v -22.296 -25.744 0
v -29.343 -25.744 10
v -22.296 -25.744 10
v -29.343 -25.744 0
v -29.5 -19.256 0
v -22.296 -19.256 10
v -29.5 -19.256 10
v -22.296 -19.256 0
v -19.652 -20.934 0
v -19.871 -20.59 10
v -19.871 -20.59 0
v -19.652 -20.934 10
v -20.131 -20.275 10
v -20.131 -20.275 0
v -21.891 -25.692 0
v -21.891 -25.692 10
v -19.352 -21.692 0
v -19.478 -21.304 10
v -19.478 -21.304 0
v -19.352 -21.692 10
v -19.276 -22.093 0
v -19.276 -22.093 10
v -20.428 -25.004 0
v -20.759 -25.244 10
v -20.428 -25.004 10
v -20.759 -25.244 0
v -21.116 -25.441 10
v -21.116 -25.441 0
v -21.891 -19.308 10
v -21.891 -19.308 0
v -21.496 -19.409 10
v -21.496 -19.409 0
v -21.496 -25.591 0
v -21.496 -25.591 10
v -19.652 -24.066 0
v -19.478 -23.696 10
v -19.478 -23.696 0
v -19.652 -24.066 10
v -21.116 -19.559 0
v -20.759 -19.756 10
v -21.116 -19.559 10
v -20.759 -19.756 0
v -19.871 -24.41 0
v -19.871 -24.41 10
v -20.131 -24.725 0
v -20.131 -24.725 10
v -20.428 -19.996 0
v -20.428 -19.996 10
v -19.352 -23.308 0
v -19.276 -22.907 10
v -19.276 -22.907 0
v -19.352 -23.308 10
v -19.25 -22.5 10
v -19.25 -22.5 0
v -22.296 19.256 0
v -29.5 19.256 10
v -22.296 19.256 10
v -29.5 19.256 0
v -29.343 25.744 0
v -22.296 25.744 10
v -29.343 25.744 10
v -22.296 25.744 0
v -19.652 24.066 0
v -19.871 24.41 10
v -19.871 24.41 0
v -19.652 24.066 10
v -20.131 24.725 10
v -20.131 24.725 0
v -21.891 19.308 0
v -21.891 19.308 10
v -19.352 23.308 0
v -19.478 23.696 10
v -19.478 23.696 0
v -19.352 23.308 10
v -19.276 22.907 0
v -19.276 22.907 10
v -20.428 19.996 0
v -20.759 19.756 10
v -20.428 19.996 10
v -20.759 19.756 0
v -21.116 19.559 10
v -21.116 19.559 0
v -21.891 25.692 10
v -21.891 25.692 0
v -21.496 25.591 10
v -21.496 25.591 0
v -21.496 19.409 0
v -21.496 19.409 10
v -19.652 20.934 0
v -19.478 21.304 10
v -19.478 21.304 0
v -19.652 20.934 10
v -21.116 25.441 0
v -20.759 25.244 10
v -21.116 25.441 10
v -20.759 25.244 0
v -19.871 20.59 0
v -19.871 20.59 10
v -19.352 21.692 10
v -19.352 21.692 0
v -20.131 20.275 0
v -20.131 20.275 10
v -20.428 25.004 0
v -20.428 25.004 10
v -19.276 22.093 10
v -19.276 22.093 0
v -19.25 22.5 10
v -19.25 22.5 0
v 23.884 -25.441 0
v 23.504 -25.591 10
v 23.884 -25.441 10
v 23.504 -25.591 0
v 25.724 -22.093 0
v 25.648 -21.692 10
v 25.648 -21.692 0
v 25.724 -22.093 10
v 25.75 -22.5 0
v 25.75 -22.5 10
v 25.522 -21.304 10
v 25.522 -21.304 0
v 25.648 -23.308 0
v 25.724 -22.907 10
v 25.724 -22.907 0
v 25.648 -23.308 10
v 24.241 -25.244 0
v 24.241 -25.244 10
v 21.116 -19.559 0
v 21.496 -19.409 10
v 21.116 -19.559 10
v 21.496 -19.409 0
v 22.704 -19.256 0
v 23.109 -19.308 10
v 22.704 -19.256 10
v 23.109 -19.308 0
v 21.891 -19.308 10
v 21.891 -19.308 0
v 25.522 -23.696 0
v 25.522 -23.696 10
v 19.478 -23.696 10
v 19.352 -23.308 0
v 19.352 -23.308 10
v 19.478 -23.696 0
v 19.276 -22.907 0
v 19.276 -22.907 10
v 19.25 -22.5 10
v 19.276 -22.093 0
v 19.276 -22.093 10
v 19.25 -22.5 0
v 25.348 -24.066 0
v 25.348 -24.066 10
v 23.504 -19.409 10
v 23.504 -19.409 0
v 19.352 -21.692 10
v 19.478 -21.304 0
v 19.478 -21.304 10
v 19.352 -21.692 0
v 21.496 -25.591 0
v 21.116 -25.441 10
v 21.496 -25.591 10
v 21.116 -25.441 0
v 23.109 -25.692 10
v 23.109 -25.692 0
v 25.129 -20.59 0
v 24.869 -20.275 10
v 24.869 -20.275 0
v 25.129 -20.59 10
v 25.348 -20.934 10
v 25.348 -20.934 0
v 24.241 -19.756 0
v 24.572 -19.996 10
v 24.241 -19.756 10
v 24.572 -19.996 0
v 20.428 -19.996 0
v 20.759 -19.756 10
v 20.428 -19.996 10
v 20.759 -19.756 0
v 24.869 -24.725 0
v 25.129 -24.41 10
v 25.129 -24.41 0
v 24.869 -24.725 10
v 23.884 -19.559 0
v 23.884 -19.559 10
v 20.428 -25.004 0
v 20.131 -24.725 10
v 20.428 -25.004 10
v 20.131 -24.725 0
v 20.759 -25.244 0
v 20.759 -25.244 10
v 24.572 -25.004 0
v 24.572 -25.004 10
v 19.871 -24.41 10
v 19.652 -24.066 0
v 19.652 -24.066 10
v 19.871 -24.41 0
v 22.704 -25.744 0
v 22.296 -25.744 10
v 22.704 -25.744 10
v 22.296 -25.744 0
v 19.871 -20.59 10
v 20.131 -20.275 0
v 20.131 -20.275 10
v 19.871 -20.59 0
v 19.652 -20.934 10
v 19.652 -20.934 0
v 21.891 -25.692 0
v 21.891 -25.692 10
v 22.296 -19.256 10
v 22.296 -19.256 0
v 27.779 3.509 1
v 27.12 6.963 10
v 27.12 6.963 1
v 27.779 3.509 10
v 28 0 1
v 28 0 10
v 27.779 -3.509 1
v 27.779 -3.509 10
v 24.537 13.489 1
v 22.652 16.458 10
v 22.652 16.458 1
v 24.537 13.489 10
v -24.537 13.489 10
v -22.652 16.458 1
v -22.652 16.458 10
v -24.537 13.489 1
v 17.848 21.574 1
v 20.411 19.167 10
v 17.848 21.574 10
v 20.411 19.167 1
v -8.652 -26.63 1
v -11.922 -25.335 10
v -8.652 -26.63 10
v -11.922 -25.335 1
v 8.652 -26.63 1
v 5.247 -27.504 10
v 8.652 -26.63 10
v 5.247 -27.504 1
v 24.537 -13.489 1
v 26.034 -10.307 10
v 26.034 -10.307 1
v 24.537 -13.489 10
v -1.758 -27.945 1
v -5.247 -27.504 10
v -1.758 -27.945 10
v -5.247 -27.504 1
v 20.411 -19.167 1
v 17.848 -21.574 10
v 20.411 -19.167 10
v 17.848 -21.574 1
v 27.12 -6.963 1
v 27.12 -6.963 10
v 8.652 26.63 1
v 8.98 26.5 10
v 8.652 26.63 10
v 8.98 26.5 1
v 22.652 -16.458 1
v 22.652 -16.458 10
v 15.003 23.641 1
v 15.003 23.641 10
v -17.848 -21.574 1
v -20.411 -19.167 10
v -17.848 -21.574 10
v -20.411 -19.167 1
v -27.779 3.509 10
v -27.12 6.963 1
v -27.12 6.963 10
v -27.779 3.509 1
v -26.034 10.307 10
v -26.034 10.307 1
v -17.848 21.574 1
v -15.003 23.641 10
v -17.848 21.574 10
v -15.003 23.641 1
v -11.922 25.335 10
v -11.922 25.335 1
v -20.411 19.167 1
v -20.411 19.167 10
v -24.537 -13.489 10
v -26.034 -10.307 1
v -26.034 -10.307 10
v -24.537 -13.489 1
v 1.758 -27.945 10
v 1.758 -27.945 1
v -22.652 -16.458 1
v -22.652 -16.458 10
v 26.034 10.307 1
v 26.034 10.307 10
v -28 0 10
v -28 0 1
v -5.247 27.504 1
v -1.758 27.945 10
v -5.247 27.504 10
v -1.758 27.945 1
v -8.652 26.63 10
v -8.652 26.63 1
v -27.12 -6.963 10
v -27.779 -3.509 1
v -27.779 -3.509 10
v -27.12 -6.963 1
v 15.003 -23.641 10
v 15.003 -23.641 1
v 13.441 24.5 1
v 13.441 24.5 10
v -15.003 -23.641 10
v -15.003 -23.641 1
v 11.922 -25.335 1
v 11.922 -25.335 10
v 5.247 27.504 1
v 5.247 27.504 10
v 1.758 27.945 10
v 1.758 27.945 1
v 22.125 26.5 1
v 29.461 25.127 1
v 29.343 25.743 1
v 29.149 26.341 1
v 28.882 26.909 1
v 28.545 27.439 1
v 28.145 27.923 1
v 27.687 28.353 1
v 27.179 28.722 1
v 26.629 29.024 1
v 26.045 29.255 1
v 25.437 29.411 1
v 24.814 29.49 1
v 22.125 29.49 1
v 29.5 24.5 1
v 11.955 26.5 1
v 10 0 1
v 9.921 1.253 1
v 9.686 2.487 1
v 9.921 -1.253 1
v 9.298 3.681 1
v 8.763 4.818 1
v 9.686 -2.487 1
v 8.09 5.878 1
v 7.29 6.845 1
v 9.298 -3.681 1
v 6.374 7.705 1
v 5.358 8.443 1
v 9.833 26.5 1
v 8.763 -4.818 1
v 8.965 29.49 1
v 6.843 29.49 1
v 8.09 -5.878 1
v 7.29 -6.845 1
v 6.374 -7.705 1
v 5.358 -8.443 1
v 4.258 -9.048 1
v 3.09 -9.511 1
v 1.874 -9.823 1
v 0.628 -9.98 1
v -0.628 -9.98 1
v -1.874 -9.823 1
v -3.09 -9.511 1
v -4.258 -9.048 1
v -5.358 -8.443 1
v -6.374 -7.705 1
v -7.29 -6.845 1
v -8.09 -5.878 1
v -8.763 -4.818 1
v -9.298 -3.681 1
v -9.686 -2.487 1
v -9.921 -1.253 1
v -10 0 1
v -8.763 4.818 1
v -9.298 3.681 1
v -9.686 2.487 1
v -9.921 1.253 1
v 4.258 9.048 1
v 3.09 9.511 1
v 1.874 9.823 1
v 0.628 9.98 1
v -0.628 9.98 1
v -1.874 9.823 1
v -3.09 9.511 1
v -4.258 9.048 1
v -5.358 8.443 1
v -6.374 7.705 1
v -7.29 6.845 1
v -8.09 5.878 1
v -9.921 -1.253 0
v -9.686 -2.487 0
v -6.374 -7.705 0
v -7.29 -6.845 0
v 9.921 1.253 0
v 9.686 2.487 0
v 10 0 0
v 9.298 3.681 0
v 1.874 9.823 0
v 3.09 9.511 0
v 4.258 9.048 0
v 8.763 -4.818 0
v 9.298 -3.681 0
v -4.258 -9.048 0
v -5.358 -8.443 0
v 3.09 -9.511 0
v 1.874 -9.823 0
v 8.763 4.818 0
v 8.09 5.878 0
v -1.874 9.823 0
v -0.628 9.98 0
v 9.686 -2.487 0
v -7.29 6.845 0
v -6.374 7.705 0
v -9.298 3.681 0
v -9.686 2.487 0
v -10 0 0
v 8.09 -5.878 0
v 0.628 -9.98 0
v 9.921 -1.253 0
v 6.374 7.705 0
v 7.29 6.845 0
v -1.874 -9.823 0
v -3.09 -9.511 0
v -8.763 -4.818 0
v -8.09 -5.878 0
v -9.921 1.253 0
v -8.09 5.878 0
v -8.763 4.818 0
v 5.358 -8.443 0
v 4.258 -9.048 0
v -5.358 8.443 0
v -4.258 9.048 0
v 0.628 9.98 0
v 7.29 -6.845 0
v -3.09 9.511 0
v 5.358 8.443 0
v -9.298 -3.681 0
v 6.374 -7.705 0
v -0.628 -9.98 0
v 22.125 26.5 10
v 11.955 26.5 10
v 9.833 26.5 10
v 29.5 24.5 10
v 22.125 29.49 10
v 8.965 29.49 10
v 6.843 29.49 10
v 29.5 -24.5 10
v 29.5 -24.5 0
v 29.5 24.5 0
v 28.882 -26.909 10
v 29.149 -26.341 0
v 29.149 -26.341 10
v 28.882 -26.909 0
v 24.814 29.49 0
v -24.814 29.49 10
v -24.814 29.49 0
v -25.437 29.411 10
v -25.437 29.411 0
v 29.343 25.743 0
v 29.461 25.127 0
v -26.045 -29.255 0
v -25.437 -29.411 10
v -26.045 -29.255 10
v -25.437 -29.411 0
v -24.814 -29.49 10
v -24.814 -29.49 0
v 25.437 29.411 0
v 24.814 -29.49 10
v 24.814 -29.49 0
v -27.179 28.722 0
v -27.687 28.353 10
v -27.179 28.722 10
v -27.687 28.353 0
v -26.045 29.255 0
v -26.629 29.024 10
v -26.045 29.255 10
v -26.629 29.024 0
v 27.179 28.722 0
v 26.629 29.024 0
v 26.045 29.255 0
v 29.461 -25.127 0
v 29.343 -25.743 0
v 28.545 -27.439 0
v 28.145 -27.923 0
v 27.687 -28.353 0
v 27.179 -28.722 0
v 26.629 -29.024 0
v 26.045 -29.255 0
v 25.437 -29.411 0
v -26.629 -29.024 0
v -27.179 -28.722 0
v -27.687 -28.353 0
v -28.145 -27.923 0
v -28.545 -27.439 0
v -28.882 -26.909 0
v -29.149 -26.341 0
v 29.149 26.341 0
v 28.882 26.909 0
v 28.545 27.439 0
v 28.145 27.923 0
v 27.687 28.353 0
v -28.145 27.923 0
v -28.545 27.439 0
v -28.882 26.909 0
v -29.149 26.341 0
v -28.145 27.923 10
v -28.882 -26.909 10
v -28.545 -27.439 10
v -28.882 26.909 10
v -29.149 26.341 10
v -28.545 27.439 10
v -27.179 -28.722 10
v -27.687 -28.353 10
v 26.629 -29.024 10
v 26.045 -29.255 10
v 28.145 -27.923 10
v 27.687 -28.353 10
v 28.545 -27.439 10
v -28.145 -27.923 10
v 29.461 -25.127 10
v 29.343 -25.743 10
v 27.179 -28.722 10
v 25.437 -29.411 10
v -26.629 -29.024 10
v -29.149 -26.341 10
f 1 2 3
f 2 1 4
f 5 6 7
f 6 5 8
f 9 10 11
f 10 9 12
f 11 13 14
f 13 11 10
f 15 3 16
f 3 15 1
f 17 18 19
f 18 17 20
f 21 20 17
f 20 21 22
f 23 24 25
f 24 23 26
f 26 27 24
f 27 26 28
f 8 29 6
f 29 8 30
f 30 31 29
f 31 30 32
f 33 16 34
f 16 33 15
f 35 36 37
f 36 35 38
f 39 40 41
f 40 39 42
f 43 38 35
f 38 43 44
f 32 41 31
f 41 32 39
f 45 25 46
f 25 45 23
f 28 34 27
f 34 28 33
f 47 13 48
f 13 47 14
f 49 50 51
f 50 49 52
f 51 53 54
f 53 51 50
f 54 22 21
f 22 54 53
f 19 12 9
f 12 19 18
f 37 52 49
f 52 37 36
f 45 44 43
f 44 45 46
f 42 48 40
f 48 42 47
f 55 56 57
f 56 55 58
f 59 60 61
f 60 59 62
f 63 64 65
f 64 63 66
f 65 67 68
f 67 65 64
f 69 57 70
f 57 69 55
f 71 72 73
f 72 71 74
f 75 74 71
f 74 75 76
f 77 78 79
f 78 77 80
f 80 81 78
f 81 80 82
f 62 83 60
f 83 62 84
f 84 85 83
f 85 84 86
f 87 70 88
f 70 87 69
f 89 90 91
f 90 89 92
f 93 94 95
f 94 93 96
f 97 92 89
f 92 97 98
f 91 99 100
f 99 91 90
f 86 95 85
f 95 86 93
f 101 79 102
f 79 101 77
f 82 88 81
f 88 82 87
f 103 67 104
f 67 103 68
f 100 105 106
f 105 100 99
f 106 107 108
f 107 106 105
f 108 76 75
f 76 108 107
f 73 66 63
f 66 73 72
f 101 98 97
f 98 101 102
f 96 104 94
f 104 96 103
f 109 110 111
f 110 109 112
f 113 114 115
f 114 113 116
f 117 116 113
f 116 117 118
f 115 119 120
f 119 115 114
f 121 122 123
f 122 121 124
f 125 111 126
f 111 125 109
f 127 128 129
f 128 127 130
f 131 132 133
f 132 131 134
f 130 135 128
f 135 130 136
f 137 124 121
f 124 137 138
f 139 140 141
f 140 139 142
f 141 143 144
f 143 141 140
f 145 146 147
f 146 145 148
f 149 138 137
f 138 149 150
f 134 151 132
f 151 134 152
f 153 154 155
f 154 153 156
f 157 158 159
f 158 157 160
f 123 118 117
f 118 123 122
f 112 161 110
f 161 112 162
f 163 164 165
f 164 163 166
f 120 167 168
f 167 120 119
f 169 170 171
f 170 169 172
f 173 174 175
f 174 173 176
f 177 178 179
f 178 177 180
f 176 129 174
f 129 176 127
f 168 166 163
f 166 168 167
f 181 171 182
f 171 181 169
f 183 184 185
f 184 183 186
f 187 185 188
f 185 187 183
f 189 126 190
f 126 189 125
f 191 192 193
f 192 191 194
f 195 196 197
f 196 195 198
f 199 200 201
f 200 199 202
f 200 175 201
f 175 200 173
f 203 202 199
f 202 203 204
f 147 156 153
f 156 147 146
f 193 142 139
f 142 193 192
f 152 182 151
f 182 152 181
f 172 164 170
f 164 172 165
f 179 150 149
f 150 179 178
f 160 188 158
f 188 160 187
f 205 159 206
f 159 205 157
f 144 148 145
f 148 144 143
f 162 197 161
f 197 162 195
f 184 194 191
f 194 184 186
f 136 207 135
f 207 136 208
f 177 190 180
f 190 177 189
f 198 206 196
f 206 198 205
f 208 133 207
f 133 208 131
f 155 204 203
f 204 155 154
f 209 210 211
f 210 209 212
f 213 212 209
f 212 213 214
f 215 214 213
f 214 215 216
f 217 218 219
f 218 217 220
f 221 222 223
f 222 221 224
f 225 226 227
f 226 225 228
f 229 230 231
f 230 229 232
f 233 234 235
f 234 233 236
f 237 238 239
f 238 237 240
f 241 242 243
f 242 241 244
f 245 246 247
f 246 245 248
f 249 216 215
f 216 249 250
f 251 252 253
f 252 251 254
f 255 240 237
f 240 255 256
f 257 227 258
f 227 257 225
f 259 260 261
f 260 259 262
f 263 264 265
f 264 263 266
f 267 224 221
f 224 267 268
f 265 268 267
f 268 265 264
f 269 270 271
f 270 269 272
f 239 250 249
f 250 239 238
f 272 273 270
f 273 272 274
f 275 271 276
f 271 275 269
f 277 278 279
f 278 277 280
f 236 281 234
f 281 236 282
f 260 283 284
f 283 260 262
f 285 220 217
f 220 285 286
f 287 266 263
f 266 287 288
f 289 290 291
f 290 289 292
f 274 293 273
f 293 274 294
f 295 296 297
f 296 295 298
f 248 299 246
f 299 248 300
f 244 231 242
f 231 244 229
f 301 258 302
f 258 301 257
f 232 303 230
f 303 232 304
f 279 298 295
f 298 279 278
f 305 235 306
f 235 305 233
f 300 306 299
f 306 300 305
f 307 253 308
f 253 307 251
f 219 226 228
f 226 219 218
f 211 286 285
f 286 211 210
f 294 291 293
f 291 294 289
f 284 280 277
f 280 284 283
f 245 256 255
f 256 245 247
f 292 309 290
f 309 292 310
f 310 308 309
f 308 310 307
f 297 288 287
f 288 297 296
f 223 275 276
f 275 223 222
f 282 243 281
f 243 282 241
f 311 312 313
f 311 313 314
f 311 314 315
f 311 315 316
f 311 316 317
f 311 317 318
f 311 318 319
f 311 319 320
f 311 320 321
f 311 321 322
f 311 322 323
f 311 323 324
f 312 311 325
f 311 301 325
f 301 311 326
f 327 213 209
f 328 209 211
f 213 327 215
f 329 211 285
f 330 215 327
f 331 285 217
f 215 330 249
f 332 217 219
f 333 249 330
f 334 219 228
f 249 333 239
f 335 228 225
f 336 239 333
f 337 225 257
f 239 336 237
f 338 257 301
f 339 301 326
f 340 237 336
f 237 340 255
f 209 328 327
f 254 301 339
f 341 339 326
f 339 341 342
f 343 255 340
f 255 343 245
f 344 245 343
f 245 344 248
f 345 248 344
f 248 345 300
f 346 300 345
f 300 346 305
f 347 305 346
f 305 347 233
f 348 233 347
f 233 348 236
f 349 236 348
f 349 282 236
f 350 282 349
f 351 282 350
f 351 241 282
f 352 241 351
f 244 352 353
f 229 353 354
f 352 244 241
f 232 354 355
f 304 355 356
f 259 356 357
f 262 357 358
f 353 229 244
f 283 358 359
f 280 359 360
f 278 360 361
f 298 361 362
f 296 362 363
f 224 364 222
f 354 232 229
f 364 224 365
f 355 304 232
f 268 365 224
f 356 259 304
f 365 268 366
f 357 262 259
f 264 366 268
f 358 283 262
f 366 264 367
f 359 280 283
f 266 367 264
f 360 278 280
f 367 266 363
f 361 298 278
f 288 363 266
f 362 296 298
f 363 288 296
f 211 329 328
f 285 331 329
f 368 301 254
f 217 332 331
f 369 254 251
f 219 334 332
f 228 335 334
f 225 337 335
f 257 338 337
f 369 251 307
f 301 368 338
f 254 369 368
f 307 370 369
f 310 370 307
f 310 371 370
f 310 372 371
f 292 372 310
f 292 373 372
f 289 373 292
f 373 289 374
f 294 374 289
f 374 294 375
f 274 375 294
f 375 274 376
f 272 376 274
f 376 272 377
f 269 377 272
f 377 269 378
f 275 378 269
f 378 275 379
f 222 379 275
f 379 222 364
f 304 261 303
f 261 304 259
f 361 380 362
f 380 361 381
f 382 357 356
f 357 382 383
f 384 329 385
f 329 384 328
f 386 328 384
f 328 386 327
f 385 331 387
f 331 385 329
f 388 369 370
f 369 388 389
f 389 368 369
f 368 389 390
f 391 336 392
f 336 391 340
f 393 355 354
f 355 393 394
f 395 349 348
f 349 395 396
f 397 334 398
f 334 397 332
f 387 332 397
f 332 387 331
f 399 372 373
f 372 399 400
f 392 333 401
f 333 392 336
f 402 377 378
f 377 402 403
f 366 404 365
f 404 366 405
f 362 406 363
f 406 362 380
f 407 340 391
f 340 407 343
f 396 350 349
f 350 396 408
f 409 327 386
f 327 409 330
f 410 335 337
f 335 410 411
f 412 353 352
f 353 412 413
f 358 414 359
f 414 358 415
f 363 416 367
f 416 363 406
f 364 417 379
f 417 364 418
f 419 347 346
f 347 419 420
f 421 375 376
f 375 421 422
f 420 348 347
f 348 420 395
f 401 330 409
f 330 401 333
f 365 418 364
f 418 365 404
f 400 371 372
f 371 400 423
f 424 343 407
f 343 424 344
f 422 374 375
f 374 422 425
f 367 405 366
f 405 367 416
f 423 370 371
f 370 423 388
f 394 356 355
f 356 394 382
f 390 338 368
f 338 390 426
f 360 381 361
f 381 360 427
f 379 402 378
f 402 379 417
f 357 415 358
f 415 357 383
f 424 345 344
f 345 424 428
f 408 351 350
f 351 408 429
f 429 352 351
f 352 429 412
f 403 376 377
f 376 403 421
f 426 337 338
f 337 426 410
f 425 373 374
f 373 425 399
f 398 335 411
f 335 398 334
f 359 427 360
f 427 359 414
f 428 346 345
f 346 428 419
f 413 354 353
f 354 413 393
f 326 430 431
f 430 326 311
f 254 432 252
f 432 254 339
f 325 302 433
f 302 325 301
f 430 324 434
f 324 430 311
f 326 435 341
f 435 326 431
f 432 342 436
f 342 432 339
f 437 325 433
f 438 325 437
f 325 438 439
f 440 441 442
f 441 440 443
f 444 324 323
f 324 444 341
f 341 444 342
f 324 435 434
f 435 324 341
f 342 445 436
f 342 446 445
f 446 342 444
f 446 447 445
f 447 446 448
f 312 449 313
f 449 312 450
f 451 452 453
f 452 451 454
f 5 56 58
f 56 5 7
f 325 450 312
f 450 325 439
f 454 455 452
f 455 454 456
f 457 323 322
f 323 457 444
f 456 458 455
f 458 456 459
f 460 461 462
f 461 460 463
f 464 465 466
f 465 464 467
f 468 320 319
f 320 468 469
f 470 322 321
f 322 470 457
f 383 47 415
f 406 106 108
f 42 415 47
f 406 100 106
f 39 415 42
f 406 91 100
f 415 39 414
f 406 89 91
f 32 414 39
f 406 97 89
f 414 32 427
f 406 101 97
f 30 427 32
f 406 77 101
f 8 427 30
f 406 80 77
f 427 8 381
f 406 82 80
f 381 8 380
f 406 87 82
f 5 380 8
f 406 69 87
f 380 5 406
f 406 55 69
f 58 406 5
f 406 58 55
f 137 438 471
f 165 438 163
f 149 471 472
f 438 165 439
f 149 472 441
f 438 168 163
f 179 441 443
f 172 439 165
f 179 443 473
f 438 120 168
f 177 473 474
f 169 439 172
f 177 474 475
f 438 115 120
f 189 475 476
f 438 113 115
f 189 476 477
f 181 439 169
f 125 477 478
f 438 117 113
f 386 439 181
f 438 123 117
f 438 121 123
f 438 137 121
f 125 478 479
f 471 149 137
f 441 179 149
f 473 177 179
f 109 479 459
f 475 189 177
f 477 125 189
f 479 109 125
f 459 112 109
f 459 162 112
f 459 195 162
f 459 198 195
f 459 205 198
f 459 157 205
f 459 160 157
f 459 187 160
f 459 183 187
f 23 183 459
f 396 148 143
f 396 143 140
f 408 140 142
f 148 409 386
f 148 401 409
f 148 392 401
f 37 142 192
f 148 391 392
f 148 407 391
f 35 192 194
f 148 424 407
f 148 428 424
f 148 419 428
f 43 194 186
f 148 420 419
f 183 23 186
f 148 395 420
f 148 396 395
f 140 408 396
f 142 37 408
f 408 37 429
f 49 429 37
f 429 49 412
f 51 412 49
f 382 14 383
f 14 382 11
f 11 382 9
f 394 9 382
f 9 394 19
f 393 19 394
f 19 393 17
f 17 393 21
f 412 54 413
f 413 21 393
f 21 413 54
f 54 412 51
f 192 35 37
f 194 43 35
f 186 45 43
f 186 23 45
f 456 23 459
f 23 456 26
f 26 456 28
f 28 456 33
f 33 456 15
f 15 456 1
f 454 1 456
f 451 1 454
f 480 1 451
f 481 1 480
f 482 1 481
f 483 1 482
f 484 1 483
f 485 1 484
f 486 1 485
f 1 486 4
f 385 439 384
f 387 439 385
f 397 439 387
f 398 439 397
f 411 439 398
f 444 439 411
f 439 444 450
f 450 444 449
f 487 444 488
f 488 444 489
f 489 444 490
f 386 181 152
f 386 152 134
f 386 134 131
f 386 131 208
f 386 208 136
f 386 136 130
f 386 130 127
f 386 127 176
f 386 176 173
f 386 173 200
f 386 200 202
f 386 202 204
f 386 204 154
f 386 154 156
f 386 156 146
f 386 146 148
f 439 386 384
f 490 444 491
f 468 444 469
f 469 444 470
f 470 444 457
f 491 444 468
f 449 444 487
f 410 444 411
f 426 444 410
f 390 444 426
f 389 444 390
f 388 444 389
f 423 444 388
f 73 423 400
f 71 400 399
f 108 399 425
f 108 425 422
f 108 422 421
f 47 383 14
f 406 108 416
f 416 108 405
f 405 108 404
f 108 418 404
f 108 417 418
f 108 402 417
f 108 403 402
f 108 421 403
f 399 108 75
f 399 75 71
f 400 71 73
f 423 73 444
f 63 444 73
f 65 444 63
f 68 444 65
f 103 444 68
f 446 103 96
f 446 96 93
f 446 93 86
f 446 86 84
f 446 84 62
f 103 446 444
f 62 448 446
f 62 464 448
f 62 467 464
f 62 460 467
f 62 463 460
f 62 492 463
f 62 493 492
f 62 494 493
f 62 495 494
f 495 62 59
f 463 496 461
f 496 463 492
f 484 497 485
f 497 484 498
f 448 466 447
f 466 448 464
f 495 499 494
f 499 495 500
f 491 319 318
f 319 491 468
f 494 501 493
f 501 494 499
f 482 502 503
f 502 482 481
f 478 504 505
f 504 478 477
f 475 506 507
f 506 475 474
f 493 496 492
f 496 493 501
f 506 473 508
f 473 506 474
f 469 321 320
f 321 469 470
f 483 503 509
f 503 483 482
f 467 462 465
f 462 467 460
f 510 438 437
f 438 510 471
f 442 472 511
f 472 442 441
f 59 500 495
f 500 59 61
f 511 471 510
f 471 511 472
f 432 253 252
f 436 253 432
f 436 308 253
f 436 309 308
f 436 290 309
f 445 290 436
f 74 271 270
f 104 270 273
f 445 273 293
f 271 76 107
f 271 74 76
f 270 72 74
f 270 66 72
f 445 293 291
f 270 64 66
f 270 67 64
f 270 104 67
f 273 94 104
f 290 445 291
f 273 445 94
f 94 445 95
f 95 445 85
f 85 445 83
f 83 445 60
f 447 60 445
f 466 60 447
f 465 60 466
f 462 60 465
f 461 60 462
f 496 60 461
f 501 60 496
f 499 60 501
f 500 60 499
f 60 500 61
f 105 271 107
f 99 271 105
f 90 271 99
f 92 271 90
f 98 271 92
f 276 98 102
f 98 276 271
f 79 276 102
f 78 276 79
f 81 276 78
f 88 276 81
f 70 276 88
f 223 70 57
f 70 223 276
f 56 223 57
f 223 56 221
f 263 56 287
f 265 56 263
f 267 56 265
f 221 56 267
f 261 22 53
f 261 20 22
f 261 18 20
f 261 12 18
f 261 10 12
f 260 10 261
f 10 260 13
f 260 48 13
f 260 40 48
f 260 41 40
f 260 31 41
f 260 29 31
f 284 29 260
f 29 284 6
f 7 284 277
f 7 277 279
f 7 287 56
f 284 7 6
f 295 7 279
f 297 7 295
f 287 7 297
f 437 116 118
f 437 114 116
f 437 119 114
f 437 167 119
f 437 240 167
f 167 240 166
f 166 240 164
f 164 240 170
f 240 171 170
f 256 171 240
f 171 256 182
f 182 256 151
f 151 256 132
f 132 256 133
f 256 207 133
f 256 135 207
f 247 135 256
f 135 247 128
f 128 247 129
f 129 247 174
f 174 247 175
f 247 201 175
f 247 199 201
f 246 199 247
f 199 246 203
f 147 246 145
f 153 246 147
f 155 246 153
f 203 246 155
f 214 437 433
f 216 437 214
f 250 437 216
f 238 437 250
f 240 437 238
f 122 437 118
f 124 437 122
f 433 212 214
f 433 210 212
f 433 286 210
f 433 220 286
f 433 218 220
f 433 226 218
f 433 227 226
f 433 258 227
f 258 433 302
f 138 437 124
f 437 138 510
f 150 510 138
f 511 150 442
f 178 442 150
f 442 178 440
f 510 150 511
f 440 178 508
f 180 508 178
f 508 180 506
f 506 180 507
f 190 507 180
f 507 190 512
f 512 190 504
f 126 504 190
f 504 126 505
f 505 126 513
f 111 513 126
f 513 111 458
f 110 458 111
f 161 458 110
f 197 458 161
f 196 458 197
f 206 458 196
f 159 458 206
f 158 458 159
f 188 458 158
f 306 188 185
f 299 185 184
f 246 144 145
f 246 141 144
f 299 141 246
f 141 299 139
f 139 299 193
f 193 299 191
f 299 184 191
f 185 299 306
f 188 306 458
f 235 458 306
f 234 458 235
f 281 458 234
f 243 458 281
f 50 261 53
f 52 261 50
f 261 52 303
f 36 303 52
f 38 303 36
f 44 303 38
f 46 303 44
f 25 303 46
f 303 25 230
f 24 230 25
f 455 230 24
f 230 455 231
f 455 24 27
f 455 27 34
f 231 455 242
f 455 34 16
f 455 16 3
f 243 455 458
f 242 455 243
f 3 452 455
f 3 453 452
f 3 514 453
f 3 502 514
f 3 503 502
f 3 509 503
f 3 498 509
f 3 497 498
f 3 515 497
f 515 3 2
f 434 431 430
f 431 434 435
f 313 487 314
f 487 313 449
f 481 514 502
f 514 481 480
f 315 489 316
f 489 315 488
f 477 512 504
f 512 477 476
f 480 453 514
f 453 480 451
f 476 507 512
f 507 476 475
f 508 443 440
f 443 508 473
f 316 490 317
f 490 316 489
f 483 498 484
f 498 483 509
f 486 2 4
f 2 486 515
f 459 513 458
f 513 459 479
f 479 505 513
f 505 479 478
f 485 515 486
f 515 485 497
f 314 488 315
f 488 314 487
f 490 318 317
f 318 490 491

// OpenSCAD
$fn = 50;


difference() {
	union() {
		translate(v = [0, 0, 0]) {
			rotate(a = [0, 0, 0]) {
				hull() {
					translate(v = [-24.5000000000, 24.5000000000, 0]) {
						rotate(a = [0, 0, 0]) {
							translate(v = [0, 0, 0]) {
								rotate(a = [0, 0, 0]) {
									cylinder(h = 10, r = 5);
								}
							}
						}
					}
					translate(v = [24.5000000000, 24.5000000000, 0]) {
						rotate(a = [0, 0, 0]) {
							translate(v = [0, 0, 0]) {
								rotate(a = [0, 0, 0]) {
									cylinder(h = 10, r = 5);
								}
							}
						}
					}
					translate(v = [-24.5000000000, -24.5000000000, 0]) {
						rotate(a = [0, 0, 0]) {
							translate(v = [0, 0, 0]) {
								rotate(a = [0, 0, 0]) {
									cylinder(h = 10, r = 5);
								}
							}
						}
					}
					translate(v = [24.5000000000, -24.5000000000, 0]) {
						rotate(a = [0, 0, 0]) {
							translate(v = [0, 0, 0]) {
								rotate(a = [0, 0, 0]) {
									cylinder(h = 10, r = 5);
								}
							}
						}
					}
				}
			}
		}
	}
	union() {
		translate(v = [-30.0000000000, -22.5000000000, -125]) {
			rotate(a = [0, 0, 0]) {
				hull() {
					translate(v = [7.5000000000, 0, 0]) {
						rotate(a = [0, 0, 0]) {
							translate(v = [0, 0, 0]) {
								rotate(a = [0, 0, 0]) {
									cylinder(h = 250, r = 3.2500000000);
								}
							}
						}
					}
					translate(v = [-7.5000000000, 0, 0]) {
						rotate(a = [0, 0, 0]) {
							translate(v = [0, 0, 0]) {
								rotate(a = [0, 0, 0]) {
									cylinder(h = 250, r = 3.2500000000);
								}
							}
						}
					}
				}
			}
		}
		translate(v = [-30.0000000000, 22.5000000000, -125]) {
			rotate(a = [0, 0, 0]) {
				hull() {
					translate(v = [7.5000000000, 0, 0]) {
						rotate(a = [0, 0, 0]) {
							translate(v = [0, 0, 0]) {
								rotate(a = [0, 0, 0]) {
									cylinder(h = 250, r = 3.2500000000);
								}
							}
						}
					}
					translate(v = [-7.5000000000, 0, 0]) {
						rotate(a = [0, 0, 0]) {
							translate(v = [0, 0, 0]) {
								rotate(a = [0, 0, 0]) {
									cylinder(h = 250, r = 3.2500000000);
								}
							}
						}
					}
				}
			}
		}
		translate(v = [22.5000000000, -22.5000000000, -125.0000000000]) {
			rotate(a = [0, 0, 0]) {
				cylinder(h = 250, r = 3.2500000000);
			}
		}
		translate(v = [0, 0, 1.0000000000]) {
			rotate(a = [0, 0, 0]) {
				cylinder(h = 12, r = 28.0000000000);
			}
		}
		translate(v = [0, 0, -5.0000000000]) {
			rotate(a = [0, 0, 0]) {
				cylinder(h = 10, r = 10.0000000000);
			}
		}
		translate(v = [0.0000000000, 24.5000000000, 1]) {
			rotate(a = [0, 0, 0]) {
				cube(size = [29.5000000000, 2, 12]);
			}
		}
		translate(v = [22.1250000000, 24.5000000000, 1]) {
			rotate(a = [0, 0, 0]) {
				cube(size = [7.3750000000, 5, 12]);
			}
		}
		translate(v = [6.0833333333, 30.2500000000, 1]) {
			rotate(a = [0, 0, -45]) {
				cube(size = [7.5000000000, 1.5000000000, 12]);
			}
		}
	}
}
